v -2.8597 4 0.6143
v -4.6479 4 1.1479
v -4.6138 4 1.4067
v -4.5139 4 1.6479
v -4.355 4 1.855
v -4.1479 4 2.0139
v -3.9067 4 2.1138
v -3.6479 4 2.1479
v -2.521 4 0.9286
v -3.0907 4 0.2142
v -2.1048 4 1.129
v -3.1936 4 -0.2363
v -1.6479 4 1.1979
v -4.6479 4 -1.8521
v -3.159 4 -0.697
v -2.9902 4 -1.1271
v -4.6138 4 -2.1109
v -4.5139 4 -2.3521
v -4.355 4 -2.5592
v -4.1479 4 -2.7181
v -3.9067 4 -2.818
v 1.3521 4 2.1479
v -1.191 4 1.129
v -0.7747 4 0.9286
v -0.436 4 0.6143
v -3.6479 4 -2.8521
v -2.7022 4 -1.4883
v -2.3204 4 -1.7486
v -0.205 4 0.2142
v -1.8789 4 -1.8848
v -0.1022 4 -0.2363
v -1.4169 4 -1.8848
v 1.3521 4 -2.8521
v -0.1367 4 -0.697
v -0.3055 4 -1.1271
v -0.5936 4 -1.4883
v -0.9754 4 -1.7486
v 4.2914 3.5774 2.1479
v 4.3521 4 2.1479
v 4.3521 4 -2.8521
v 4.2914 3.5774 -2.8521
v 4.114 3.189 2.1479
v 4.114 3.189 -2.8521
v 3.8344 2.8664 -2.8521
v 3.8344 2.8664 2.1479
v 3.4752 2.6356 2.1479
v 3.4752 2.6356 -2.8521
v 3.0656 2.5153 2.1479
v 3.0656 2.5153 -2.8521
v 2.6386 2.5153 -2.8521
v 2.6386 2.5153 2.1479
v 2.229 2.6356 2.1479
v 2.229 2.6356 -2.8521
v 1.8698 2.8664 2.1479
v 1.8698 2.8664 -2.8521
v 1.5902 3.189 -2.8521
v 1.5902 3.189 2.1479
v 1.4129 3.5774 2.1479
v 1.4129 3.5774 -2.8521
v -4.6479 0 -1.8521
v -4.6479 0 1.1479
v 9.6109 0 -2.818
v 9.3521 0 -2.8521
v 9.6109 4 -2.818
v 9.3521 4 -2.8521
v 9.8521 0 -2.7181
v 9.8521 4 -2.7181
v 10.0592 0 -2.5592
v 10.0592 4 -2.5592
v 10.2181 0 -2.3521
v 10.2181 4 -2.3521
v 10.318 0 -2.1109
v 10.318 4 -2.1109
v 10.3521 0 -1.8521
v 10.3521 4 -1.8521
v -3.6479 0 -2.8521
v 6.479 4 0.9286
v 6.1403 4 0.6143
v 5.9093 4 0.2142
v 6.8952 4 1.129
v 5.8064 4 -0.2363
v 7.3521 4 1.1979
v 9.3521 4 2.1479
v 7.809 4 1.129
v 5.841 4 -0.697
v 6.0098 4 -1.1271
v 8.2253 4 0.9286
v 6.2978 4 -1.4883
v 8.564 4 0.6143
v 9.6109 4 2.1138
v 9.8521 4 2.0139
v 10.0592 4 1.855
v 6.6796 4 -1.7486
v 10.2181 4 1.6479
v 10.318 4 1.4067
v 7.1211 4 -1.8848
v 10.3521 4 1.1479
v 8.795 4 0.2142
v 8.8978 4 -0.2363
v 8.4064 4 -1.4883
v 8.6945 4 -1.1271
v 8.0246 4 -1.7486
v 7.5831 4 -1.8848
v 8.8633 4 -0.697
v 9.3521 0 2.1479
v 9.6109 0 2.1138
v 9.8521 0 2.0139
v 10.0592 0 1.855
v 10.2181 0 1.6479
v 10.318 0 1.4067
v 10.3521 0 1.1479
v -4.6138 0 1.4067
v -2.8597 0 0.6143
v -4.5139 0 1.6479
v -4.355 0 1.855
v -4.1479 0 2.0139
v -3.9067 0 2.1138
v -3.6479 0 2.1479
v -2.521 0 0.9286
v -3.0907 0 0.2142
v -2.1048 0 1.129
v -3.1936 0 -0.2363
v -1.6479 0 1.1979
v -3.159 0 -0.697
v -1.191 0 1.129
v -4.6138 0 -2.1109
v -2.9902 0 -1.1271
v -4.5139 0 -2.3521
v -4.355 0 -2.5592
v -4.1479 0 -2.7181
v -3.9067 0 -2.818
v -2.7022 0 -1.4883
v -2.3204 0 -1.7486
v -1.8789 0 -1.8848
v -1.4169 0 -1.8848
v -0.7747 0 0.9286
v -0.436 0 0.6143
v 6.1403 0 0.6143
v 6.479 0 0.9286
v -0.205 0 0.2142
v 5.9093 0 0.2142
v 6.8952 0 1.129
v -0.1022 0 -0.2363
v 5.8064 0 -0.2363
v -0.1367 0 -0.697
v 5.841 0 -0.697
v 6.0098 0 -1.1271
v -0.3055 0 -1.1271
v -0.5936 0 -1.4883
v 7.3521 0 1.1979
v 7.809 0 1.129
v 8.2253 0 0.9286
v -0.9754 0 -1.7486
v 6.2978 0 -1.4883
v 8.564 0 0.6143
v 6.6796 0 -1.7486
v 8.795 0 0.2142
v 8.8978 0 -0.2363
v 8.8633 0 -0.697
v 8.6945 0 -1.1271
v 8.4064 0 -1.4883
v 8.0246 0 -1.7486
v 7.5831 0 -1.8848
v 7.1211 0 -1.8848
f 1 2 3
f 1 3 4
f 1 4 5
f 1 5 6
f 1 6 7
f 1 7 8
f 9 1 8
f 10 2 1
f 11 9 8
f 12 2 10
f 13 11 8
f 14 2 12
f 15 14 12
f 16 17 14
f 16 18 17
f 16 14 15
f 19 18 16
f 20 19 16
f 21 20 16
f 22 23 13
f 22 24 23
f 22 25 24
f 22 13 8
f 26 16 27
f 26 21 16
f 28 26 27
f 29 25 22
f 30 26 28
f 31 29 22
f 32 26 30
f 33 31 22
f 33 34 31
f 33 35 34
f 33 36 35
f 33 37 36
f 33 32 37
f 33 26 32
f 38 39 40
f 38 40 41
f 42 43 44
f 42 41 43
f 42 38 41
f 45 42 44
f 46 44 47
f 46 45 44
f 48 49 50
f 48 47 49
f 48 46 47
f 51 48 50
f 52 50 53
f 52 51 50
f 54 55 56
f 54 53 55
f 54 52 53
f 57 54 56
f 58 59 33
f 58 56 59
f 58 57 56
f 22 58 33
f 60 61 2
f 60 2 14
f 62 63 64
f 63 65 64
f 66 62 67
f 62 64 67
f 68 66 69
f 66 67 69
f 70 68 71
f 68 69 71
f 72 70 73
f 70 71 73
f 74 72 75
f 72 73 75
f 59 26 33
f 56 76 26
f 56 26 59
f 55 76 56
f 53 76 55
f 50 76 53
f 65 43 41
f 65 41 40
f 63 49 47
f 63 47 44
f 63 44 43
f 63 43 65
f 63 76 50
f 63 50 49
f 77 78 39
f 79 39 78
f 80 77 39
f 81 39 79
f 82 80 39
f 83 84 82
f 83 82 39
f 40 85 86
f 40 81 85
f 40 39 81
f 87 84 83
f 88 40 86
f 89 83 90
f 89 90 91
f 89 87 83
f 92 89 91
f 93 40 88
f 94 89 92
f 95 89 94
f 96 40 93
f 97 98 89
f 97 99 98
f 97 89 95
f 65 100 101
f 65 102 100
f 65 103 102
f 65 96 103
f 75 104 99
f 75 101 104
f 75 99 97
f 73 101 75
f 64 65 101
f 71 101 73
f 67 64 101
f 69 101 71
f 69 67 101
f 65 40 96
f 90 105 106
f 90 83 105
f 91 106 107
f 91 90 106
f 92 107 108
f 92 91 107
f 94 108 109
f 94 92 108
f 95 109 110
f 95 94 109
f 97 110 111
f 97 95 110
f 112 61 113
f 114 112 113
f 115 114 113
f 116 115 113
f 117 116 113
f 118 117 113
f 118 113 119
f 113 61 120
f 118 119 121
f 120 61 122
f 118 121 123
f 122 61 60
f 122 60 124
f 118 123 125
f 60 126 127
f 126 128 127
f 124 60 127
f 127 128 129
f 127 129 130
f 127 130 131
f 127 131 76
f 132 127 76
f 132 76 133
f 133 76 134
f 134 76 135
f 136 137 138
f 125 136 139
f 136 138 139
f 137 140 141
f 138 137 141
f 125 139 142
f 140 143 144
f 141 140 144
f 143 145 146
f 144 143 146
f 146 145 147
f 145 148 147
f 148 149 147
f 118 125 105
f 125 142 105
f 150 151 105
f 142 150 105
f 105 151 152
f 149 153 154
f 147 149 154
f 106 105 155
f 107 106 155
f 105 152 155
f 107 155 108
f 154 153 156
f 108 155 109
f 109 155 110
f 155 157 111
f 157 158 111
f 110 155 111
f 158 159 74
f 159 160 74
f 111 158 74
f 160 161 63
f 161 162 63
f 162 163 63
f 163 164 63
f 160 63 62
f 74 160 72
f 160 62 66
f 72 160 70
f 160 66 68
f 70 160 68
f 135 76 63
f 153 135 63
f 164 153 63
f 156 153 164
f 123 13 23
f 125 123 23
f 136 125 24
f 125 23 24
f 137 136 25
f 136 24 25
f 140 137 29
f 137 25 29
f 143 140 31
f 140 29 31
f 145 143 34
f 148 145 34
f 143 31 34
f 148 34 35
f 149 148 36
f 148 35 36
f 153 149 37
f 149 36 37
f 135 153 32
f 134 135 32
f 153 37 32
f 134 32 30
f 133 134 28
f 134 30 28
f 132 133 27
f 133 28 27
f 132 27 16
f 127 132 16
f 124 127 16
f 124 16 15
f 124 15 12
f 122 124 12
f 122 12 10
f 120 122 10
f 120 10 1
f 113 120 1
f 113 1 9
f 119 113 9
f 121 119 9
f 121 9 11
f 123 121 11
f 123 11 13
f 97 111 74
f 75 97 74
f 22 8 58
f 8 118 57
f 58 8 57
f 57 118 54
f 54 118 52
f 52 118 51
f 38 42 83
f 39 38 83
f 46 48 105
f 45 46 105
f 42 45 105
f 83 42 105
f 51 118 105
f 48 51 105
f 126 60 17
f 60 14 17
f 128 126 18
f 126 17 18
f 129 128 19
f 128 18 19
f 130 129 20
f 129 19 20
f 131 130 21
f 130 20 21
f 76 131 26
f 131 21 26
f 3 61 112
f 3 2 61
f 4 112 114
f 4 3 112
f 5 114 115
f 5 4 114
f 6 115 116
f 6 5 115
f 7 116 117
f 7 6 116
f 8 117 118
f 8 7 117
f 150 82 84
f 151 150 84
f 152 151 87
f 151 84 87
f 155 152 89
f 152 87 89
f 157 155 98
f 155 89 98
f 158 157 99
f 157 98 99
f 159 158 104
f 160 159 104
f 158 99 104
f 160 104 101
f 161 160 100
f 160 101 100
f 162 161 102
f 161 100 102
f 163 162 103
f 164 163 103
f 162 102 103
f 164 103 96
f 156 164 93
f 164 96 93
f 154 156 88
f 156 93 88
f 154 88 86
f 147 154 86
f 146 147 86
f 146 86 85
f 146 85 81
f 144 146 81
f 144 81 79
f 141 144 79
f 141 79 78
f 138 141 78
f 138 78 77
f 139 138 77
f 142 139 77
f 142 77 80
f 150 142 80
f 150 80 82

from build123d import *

# Parameters (mm, degrees)
SKETCH1_W               = 15
SKETCH1_H               = 5
BOSS_EXTRUDE1_DEPTH     = 4
CUT_EXTRUDE1_DEPTH      = 13.172355436
CUT_EXTRUDE1_DEPTH_BACK = 13.172355436
SKETCH2_R               = 1.5
SKETCH3_R               = 1.55
CUT_EXTRUDE2_DEPTH      = 12.4586554
FILLET1_R               = 1


with BuildPart() as part:
    # Sketch1 → Boss-Extrude1 (new body)
    with BuildSketch(Plane(origin=(0, 0, 0), x_dir=(1, 0, 0), z_dir=(0, 1, 0))):
        with Locations((2.852112676, 0.352112676)):
            Rectangle(SKETCH1_W, SKETCH1_H)
    extrude(amount=BOSS_EXTRUDE1_DEPTH)

    # Sketch2 → Cut-Extrude1 (cut, two sides: drawn at the far end of the back side and taken through both)
    with BuildSketch(Plane(origin=(0, 0, -2.852112676), x_dir=(-1, 0, 0), z_dir=(0, 0, -1)).offset(-CUT_EXTRUDE1_DEPTH_BACK)):
        with Locations((-2.852112676, 4)):
            Circle(SKETCH2_R)
    extrude(amount=CUT_EXTRUDE1_DEPTH + CUT_EXTRUDE1_DEPTH_BACK, mode=Mode.SUBTRACT)

    # Sketch3 → Cut-Extrude2 (cut, through all)
    with BuildSketch(Plane(origin=(0, 4, 0), x_dir=(1, 0, 0), z_dir=(0, 1, 0))):
        with Locations(Location((-1.647887324, 0.352112676, 0), (0, 0, 270))):
            Circle(SKETCH3_R)
        with Locations(Location((7.352112676, 0.352112676, 0), (0, 0, 270))):
            Circle(SKETCH3_R)
    extrude(amount=-CUT_EXTRUDE2_DEPTH, mode=Mode.SUBTRACT)

    # Fillet1
    fillet1_edges = [part.edges().sort_by_distance(p)[0] for p in [
        (-4.647887324, 2, -2.852112676),
        (10.352112676, 2, -2.852112676),
        (10.352112676, 2, 2.147887324),
        (-4.647887324, 2, 2.147887324),
    ]]
    fillet(fillet1_edges, radius=FILLET1_R)


solid = part.part
